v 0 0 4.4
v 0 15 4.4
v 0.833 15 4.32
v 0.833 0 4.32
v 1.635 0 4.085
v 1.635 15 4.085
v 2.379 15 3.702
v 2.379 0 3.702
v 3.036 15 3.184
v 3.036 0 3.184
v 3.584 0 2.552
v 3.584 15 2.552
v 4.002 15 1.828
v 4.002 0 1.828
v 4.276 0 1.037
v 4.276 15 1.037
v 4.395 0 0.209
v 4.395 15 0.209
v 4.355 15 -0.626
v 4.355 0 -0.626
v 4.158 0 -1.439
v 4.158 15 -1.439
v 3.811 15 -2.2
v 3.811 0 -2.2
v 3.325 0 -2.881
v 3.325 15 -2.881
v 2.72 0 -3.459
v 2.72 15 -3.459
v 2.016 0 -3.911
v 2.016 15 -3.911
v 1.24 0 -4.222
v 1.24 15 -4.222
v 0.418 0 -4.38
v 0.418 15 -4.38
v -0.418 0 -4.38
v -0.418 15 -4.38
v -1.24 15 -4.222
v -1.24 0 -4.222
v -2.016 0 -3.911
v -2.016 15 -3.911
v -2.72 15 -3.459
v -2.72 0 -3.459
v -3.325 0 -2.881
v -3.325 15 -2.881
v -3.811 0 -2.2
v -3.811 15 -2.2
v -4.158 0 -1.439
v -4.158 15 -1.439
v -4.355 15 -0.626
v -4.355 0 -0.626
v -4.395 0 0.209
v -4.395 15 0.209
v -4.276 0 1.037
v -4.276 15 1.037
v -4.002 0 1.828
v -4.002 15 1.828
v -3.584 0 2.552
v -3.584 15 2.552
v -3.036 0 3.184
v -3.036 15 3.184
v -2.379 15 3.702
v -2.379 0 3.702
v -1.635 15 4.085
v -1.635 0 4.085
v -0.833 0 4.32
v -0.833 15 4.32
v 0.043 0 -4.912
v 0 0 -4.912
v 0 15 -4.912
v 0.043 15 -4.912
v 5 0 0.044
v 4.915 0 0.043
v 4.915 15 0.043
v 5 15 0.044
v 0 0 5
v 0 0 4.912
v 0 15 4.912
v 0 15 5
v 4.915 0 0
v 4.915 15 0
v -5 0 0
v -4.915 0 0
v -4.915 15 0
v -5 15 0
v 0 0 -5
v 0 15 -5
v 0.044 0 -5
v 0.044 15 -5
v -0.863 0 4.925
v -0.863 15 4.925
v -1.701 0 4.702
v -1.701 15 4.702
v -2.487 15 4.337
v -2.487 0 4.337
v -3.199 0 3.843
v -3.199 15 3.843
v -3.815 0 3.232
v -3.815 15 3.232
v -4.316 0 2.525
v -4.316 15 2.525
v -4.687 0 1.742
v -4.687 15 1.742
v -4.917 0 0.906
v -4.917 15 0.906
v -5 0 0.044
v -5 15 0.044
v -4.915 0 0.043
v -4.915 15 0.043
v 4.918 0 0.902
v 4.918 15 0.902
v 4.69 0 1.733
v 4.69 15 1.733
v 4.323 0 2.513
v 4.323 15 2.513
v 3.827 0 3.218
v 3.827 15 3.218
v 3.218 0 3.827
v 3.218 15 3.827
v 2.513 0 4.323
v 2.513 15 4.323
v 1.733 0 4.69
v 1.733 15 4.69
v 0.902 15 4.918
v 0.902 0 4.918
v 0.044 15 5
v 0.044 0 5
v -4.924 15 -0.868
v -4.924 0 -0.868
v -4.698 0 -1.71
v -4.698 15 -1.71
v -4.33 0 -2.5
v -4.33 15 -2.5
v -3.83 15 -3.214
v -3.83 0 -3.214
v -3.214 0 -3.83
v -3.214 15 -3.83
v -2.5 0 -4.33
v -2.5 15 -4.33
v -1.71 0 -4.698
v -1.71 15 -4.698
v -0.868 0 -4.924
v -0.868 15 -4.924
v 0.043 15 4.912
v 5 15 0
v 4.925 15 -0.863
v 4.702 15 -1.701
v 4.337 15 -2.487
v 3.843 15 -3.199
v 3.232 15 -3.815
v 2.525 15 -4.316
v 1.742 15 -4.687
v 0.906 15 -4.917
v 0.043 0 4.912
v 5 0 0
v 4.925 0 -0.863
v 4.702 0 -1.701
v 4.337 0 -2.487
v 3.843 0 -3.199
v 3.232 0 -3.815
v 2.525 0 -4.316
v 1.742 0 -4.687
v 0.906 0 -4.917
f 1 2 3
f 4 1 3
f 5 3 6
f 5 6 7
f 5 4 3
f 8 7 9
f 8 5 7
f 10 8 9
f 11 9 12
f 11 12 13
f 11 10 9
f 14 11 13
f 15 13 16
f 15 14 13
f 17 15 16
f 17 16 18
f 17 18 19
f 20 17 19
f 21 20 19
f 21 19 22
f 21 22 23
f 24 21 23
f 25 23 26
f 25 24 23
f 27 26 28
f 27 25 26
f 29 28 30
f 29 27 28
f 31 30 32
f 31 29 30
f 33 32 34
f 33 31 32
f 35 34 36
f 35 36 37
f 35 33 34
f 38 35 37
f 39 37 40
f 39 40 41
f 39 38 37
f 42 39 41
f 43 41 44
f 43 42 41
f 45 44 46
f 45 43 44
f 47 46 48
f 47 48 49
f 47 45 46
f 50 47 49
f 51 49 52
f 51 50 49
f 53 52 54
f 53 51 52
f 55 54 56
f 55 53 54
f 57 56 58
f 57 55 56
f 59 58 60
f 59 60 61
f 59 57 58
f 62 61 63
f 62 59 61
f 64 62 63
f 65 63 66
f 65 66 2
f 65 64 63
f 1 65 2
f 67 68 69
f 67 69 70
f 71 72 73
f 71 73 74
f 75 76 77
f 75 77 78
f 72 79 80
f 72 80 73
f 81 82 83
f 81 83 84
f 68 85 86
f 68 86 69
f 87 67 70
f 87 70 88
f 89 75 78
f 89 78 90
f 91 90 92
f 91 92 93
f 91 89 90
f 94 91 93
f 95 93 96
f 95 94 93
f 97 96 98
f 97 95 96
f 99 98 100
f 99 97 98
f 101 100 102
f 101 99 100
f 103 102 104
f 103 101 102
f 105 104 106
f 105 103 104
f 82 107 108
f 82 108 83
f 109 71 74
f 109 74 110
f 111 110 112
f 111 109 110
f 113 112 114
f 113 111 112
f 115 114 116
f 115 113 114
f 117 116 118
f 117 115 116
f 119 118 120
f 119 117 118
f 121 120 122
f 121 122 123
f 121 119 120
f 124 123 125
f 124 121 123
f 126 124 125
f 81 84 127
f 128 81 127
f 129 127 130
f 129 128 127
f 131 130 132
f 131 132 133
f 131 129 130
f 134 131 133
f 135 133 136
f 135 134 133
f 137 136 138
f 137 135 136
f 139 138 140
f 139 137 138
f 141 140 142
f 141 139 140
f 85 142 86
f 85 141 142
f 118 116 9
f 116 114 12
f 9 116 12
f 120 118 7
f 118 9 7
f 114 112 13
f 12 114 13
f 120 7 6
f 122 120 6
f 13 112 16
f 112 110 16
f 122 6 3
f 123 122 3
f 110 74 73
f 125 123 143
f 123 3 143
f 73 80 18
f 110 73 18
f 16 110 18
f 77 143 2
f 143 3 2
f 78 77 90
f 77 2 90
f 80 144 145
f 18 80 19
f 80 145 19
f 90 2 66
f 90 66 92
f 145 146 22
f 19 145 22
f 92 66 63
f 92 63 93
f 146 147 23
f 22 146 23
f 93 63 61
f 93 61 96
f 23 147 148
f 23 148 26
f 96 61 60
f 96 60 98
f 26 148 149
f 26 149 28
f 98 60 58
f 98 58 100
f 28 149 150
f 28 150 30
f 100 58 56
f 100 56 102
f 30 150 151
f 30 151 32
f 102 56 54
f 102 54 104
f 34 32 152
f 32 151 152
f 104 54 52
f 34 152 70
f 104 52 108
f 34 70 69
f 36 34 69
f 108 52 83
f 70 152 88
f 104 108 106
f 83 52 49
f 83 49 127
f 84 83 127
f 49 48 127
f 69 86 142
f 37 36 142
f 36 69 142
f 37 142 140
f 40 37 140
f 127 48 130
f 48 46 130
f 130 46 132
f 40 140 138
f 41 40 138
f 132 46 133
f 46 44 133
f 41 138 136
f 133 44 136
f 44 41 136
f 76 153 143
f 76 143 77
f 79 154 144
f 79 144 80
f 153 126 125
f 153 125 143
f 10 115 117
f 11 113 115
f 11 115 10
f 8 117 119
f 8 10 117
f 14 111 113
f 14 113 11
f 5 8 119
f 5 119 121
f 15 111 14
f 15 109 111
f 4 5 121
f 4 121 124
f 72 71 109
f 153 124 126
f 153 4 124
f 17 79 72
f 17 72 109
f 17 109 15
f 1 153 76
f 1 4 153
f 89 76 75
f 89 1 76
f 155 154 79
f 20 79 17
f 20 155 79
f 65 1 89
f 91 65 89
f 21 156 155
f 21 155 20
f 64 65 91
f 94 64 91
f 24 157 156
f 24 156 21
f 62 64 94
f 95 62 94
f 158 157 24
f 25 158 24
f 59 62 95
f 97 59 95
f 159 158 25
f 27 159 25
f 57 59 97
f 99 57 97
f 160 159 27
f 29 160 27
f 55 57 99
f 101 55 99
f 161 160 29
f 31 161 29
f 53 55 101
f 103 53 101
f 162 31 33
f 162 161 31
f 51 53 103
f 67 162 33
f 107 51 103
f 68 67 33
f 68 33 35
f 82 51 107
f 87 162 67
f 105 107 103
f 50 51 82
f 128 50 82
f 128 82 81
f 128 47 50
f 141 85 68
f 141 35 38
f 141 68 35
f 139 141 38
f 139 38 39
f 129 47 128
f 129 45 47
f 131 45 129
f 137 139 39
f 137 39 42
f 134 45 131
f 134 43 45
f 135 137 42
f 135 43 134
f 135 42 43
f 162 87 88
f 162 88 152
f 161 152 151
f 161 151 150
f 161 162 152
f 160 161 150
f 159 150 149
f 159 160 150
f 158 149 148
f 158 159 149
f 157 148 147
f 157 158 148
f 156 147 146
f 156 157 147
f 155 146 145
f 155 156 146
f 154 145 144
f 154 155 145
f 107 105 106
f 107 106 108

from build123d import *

# Parameters (mm, degrees)
SKETCH1_R           = 4.4
BOSS_EXTRUDE1_DEPTH = 15


with BuildPart() as part:
    # Sketch1 → Boss-Extrude1 (new body)
    with BuildSketch(Plane(origin=(0, 0, 0), x_dir=(1, 0, 0), z_dir=(0, 1, 0))):
        with BuildLine():
            Line((0, 5), (0, 4.912292599))
            Line((0, 4.912292599), (0.042868928, 4.912292599))
            Line((0.042868928, 4.912292599), (0.043632677, 4.999809615))
            ThreePointArc((0.043632677, 4.999809615), (3.550926878, 3.520073622), (5, 0))
            Line((5, 0), (4.915051898, 0))
            Line((4.915051898, 0), (4.915051898, -0.042893008))
            Line((4.915051898, -0.042893008), (4.999809615, -0.043632677))
            ThreePointArc((4.999809615, -0.043632677), (3.535533906, -3.535533906), (0.043632677, -4.999809615))
            Line((0.043632677, -4.999809615), (0.042868928, -4.912292599))
            Line((0.042868928, -4.912292599), (0, -4.912292599))
            Line((0, -4.912292599), (0, -5))
            ThreePointArc((0, -5), (-3.520073622, -3.550926878), (-4.999809615, -0.043632677))
            Line((-4.999809615, -0.043632677), (-4.915051898, -0.042893008))
            Line((-4.915051898, -0.042893008), (-4.915051898, 0))
            Line((-4.915051898, 0), (-5, 0))
            ThreePointArc((-5, 0), (-3.535533906, 3.535533906), (0, 5))
        make_face()
        with Locations(Location((0, 0, 0), (0, 0, 270))):
            Circle(SKETCH1_R, mode=Mode.SUBTRACT)
    extrude(amount=BOSS_EXTRUDE1_DEPTH)


solid = part.part
